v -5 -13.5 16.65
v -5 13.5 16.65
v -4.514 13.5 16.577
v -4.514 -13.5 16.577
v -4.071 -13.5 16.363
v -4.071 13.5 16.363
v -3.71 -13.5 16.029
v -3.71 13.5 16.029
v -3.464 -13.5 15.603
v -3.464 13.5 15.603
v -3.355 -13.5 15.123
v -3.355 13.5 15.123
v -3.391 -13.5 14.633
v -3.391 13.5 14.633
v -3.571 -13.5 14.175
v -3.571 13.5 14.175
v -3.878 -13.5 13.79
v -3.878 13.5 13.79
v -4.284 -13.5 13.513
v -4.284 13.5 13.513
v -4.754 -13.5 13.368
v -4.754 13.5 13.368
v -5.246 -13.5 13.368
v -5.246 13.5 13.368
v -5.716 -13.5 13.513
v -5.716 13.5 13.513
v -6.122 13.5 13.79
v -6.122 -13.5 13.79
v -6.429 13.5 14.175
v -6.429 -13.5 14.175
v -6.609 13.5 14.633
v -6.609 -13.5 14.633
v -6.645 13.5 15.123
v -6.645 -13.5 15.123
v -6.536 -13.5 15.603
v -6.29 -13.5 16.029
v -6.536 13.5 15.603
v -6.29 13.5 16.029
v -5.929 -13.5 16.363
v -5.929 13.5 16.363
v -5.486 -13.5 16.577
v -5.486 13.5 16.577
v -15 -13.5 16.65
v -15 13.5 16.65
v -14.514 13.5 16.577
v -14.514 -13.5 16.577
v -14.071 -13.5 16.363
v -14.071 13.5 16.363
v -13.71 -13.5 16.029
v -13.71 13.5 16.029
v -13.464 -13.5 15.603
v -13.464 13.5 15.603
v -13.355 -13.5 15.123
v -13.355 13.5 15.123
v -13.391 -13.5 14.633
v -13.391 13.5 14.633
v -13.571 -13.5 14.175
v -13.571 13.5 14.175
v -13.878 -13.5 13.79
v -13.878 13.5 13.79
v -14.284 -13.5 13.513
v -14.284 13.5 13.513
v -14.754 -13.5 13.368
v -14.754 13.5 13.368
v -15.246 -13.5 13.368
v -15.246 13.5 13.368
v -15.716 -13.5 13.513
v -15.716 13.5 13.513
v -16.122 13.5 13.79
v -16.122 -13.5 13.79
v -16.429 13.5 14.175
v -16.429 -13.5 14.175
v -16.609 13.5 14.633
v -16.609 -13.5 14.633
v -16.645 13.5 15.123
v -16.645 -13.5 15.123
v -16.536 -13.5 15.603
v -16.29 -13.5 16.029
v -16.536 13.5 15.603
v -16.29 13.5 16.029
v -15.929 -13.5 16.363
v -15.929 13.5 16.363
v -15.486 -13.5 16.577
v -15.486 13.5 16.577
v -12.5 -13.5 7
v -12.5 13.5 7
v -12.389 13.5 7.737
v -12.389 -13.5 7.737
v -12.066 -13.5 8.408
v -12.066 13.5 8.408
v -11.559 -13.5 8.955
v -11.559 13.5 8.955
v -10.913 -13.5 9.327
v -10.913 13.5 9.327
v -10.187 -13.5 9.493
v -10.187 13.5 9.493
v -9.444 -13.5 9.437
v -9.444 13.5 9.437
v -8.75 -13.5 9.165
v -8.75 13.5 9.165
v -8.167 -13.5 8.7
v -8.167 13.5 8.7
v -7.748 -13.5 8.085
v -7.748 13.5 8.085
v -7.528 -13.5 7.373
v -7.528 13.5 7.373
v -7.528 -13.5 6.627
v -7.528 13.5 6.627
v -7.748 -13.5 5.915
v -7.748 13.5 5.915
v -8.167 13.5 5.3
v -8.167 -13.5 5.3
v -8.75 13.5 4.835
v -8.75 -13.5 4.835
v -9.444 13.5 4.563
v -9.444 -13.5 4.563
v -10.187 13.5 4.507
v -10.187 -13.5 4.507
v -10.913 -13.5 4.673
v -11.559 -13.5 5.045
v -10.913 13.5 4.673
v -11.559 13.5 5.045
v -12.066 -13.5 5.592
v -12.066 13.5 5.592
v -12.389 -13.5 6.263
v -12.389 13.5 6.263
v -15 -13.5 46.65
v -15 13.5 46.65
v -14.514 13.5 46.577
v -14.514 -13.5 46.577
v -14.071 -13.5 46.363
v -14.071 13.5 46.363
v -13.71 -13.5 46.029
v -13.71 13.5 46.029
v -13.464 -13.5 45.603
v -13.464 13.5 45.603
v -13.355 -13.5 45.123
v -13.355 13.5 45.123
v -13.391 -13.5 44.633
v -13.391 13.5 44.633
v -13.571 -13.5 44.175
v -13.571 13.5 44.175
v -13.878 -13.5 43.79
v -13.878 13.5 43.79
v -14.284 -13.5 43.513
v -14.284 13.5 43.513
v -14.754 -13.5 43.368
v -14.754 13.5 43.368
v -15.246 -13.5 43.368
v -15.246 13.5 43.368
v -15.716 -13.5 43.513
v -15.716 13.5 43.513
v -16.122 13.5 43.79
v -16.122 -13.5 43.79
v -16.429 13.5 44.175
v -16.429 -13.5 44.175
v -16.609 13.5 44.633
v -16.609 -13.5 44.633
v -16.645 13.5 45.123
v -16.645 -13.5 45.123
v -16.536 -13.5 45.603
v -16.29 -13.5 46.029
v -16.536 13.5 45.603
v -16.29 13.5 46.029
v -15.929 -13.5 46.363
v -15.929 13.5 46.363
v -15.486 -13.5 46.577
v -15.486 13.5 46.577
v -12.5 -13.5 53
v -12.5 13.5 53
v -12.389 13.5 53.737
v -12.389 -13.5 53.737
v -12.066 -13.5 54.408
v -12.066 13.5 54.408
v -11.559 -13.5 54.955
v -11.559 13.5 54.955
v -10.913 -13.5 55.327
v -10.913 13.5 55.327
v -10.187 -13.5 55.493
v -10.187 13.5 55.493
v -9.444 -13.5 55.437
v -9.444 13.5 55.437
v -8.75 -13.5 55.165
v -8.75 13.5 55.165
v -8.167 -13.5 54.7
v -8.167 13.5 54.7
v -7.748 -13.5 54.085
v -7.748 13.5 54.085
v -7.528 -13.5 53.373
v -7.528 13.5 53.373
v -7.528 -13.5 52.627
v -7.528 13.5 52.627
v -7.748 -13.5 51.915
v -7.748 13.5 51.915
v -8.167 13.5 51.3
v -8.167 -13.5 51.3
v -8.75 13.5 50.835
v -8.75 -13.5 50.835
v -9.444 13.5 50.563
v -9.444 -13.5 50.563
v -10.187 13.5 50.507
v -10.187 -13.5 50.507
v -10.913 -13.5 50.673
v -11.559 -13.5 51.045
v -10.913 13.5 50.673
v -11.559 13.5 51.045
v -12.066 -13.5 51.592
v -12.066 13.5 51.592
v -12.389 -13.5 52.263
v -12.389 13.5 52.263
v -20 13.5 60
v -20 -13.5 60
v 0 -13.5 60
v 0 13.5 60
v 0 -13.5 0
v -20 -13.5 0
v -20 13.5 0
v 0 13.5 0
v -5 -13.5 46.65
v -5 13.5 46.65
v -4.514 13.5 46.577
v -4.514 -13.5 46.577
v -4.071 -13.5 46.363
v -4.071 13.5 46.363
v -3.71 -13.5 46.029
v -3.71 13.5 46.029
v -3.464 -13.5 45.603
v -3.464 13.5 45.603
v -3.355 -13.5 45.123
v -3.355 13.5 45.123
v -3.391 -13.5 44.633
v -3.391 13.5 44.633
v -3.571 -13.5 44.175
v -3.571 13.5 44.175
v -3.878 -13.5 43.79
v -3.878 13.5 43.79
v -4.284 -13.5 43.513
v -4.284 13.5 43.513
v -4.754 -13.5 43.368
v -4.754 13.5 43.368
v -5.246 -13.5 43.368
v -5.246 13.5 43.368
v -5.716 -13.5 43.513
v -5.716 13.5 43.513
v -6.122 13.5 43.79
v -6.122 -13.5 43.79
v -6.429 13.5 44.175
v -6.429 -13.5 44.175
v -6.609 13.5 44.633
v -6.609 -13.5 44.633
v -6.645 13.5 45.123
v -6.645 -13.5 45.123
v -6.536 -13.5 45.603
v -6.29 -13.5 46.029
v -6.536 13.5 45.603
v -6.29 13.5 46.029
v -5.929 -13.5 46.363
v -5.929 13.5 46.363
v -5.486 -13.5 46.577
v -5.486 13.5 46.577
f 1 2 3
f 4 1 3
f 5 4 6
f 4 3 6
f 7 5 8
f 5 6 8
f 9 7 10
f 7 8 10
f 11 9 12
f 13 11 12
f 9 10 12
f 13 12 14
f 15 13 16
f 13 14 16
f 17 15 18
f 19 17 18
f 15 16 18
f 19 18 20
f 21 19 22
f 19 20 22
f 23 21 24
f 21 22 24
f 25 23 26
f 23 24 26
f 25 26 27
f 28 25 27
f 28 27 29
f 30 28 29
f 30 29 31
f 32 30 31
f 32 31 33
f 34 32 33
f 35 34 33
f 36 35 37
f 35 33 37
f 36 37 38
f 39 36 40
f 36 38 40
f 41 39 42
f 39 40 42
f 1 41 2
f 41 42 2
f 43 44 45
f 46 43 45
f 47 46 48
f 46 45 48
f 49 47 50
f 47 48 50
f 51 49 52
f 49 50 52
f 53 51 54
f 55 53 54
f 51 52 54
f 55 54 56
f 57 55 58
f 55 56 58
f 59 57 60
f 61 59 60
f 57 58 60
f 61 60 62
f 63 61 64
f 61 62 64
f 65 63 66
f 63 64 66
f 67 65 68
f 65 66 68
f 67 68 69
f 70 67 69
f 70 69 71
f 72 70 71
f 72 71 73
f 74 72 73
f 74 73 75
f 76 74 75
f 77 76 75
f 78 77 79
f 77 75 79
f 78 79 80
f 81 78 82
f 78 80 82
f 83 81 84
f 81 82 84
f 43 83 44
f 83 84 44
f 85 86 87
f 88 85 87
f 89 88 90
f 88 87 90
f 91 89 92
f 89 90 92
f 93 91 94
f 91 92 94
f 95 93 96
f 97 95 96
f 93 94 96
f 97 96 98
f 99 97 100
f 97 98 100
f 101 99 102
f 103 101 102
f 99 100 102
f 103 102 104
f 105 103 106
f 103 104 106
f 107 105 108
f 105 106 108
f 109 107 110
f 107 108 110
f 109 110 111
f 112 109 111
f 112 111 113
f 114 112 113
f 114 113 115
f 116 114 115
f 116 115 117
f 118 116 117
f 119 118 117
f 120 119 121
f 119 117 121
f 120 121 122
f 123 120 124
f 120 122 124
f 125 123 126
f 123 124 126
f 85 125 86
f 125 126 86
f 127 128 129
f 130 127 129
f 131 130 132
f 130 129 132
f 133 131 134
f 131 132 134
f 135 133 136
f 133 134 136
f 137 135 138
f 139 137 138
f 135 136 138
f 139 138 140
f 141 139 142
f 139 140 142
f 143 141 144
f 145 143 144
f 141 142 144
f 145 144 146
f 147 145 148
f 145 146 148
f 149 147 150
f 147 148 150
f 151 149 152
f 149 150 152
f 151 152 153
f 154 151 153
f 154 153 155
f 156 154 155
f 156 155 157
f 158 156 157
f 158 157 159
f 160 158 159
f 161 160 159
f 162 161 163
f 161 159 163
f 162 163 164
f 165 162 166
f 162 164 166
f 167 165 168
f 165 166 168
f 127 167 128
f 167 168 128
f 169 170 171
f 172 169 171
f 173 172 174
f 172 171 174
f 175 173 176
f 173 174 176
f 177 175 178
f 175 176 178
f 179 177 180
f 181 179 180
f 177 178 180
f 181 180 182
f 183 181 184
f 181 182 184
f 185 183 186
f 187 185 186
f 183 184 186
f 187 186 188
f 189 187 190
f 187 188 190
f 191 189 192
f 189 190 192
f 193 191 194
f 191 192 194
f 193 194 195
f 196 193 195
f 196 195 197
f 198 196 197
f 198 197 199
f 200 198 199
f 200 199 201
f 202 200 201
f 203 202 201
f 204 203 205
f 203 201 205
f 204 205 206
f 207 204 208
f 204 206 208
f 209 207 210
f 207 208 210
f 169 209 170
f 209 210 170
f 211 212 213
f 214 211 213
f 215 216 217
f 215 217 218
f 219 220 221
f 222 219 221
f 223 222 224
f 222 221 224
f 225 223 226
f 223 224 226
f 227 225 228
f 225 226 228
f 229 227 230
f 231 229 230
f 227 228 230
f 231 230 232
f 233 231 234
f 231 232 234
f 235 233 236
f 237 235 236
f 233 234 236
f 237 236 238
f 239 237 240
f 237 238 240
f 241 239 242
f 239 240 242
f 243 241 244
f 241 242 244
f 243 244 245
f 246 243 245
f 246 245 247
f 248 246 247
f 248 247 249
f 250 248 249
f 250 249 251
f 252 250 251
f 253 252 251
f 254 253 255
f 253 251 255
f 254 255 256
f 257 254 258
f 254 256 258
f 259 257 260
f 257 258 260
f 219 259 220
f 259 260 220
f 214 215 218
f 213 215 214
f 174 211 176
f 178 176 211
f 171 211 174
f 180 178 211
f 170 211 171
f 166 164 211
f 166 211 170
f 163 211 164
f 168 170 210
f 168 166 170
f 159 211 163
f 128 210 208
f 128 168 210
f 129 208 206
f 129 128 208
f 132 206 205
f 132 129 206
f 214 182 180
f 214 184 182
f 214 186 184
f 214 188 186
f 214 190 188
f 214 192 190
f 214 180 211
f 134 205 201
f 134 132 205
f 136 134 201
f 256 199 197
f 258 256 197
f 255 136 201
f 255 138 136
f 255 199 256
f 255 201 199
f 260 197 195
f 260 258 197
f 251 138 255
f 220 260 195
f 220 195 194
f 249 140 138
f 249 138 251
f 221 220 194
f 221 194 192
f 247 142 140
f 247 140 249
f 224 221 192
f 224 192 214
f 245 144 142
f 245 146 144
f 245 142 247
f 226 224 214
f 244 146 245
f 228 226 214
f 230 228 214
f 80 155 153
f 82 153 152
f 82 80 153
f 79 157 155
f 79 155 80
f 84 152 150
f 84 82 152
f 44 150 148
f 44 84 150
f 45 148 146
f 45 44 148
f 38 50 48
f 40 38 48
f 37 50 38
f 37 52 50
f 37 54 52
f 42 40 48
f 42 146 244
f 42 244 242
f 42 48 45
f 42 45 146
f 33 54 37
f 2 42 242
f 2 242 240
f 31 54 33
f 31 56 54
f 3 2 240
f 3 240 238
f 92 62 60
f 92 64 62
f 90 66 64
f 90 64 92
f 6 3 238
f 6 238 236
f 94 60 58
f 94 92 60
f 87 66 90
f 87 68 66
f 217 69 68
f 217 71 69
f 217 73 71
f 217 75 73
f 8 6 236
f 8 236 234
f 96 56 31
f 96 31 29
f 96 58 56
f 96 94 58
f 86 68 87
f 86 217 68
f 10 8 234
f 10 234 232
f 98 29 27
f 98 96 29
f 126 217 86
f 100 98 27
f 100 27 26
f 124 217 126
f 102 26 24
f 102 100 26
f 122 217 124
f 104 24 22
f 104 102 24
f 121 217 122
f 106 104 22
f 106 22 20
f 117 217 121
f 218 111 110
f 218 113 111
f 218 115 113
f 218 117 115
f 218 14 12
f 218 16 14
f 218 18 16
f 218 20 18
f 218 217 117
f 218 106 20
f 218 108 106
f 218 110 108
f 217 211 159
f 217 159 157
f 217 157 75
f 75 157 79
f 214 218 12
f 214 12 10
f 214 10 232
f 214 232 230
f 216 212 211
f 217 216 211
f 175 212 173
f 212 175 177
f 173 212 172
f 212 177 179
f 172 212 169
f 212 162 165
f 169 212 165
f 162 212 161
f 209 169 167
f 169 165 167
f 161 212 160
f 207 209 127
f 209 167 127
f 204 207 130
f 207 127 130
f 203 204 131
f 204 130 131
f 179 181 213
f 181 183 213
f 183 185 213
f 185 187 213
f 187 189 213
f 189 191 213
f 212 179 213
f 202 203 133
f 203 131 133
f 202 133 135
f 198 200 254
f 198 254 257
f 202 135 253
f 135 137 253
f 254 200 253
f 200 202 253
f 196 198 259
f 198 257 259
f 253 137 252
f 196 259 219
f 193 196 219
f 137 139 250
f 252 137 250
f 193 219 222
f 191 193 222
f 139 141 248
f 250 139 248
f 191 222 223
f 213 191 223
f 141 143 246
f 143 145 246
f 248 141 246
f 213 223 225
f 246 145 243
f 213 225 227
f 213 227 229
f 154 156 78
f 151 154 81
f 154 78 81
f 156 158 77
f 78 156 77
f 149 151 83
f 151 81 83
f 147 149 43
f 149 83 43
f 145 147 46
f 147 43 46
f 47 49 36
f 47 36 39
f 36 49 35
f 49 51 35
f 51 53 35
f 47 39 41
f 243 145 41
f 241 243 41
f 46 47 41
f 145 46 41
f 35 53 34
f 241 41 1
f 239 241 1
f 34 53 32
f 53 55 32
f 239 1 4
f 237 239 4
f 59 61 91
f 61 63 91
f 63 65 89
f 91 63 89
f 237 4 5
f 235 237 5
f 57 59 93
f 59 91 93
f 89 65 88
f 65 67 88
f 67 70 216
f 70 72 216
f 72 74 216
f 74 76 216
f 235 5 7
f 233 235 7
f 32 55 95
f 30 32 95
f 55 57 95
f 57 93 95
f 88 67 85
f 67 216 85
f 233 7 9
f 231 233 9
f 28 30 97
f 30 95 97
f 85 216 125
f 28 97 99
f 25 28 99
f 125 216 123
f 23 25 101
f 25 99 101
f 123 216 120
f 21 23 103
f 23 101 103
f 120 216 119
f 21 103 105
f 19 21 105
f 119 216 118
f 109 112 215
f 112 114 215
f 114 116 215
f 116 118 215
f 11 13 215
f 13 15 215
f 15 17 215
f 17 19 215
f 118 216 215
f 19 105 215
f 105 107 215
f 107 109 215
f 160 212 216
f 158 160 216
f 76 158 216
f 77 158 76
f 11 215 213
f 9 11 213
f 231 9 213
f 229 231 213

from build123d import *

# Parameters (mm, degrees)
SKETCH_1_W             = 40
SKETCH_1_H             = 27
EXTRUDE_1_DEPTH        = 60
SKETCH_2_R             = 2.5
CUT_EXTRUDE_1_DEPTH    = 27
PATTERN_LINEAR_1_COUNT = 2
PATTERN_LINEAR_1_PITCH = 46
SKETCH_4_R             = 1.65
CUT_EXTRUDE_3_DEPTH    = 27
SKETCH_5_W             = 20
SKETCH_5_H             = 60
CUT_EXTRUDE_4_DEPTH    = 30
PATTERN_LINEAR_2_COUNT = 2
PATTERN_LINEAR_2_PITCH = 10


with BuildPart() as part:
    # Эскиз1 → Бобышка-Вытянуть1 (new body)
    with BuildSketch(Plane.XY):
        Rectangle(SKETCH_1_W, SKETCH_1_H)
    extrude(amount=EXTRUDE_1_DEPTH)

    # Эскиз2 → Вырез-Вытянуть1 (cut)
    with BuildSketch(Plane(origin=(0, 13.5, 0), x_dir=(1, 0, 0), z_dir=(0, 1, 0))):
        with Locations(Location((-10, -7, 0), (0, 0, 180))):
            Circle(SKETCH_2_R)
    cut_extrude_1 = extrude(amount=-CUT_EXTRUDE_1_DEPTH, mode=Mode.SUBTRACT)

    # Линейный массив1: Вырез-Вытянуть1 ×2
    with Locations(*[(0, 0, i * PATTERN_LINEAR_1_PITCH) for i in range(1, PATTERN_LINEAR_1_COUNT)]):
        add(cut_extrude_1, mode=Mode.SUBTRACT)

    # Эскиз4 → Вырез-Вытянуть3 (cut)
    with BuildSketch(Plane(origin=(0, 13.5, 0), x_dir=(1, 0, 0), z_dir=(0, 1, 0))):
        with Locations(Location((-15, -15, 0), (0, 0, 270))):
            Circle(SKETCH_4_R)
        with Locations(Location((-15, -45, 0), (0, 0, 270))):
            Circle(SKETCH_4_R)
    cut_extrude_3 = extrude(amount=-CUT_EXTRUDE_3_DEPTH, mode=Mode.SUBTRACT)

    # Эскиз5 → Вырез-Вытянуть4 (cut)
    with BuildSketch(Plane.XZ.offset(13.5)):
        with Locations((10, 30)):
            Rectangle(SKETCH_5_W, SKETCH_5_H)
    extrude(amount=-CUT_EXTRUDE_4_DEPTH, mode=Mode.SUBTRACT)

    # Линейный массив2: Вырез-Вытянуть3 ×2
    with Locations(*[(i * PATTERN_LINEAR_2_PITCH, 0, 0) for i in range(1, PATTERN_LINEAR_2_COUNT)]):
        add(cut_extrude_3, mode=Mode.SUBTRACT)


solid = part.part
